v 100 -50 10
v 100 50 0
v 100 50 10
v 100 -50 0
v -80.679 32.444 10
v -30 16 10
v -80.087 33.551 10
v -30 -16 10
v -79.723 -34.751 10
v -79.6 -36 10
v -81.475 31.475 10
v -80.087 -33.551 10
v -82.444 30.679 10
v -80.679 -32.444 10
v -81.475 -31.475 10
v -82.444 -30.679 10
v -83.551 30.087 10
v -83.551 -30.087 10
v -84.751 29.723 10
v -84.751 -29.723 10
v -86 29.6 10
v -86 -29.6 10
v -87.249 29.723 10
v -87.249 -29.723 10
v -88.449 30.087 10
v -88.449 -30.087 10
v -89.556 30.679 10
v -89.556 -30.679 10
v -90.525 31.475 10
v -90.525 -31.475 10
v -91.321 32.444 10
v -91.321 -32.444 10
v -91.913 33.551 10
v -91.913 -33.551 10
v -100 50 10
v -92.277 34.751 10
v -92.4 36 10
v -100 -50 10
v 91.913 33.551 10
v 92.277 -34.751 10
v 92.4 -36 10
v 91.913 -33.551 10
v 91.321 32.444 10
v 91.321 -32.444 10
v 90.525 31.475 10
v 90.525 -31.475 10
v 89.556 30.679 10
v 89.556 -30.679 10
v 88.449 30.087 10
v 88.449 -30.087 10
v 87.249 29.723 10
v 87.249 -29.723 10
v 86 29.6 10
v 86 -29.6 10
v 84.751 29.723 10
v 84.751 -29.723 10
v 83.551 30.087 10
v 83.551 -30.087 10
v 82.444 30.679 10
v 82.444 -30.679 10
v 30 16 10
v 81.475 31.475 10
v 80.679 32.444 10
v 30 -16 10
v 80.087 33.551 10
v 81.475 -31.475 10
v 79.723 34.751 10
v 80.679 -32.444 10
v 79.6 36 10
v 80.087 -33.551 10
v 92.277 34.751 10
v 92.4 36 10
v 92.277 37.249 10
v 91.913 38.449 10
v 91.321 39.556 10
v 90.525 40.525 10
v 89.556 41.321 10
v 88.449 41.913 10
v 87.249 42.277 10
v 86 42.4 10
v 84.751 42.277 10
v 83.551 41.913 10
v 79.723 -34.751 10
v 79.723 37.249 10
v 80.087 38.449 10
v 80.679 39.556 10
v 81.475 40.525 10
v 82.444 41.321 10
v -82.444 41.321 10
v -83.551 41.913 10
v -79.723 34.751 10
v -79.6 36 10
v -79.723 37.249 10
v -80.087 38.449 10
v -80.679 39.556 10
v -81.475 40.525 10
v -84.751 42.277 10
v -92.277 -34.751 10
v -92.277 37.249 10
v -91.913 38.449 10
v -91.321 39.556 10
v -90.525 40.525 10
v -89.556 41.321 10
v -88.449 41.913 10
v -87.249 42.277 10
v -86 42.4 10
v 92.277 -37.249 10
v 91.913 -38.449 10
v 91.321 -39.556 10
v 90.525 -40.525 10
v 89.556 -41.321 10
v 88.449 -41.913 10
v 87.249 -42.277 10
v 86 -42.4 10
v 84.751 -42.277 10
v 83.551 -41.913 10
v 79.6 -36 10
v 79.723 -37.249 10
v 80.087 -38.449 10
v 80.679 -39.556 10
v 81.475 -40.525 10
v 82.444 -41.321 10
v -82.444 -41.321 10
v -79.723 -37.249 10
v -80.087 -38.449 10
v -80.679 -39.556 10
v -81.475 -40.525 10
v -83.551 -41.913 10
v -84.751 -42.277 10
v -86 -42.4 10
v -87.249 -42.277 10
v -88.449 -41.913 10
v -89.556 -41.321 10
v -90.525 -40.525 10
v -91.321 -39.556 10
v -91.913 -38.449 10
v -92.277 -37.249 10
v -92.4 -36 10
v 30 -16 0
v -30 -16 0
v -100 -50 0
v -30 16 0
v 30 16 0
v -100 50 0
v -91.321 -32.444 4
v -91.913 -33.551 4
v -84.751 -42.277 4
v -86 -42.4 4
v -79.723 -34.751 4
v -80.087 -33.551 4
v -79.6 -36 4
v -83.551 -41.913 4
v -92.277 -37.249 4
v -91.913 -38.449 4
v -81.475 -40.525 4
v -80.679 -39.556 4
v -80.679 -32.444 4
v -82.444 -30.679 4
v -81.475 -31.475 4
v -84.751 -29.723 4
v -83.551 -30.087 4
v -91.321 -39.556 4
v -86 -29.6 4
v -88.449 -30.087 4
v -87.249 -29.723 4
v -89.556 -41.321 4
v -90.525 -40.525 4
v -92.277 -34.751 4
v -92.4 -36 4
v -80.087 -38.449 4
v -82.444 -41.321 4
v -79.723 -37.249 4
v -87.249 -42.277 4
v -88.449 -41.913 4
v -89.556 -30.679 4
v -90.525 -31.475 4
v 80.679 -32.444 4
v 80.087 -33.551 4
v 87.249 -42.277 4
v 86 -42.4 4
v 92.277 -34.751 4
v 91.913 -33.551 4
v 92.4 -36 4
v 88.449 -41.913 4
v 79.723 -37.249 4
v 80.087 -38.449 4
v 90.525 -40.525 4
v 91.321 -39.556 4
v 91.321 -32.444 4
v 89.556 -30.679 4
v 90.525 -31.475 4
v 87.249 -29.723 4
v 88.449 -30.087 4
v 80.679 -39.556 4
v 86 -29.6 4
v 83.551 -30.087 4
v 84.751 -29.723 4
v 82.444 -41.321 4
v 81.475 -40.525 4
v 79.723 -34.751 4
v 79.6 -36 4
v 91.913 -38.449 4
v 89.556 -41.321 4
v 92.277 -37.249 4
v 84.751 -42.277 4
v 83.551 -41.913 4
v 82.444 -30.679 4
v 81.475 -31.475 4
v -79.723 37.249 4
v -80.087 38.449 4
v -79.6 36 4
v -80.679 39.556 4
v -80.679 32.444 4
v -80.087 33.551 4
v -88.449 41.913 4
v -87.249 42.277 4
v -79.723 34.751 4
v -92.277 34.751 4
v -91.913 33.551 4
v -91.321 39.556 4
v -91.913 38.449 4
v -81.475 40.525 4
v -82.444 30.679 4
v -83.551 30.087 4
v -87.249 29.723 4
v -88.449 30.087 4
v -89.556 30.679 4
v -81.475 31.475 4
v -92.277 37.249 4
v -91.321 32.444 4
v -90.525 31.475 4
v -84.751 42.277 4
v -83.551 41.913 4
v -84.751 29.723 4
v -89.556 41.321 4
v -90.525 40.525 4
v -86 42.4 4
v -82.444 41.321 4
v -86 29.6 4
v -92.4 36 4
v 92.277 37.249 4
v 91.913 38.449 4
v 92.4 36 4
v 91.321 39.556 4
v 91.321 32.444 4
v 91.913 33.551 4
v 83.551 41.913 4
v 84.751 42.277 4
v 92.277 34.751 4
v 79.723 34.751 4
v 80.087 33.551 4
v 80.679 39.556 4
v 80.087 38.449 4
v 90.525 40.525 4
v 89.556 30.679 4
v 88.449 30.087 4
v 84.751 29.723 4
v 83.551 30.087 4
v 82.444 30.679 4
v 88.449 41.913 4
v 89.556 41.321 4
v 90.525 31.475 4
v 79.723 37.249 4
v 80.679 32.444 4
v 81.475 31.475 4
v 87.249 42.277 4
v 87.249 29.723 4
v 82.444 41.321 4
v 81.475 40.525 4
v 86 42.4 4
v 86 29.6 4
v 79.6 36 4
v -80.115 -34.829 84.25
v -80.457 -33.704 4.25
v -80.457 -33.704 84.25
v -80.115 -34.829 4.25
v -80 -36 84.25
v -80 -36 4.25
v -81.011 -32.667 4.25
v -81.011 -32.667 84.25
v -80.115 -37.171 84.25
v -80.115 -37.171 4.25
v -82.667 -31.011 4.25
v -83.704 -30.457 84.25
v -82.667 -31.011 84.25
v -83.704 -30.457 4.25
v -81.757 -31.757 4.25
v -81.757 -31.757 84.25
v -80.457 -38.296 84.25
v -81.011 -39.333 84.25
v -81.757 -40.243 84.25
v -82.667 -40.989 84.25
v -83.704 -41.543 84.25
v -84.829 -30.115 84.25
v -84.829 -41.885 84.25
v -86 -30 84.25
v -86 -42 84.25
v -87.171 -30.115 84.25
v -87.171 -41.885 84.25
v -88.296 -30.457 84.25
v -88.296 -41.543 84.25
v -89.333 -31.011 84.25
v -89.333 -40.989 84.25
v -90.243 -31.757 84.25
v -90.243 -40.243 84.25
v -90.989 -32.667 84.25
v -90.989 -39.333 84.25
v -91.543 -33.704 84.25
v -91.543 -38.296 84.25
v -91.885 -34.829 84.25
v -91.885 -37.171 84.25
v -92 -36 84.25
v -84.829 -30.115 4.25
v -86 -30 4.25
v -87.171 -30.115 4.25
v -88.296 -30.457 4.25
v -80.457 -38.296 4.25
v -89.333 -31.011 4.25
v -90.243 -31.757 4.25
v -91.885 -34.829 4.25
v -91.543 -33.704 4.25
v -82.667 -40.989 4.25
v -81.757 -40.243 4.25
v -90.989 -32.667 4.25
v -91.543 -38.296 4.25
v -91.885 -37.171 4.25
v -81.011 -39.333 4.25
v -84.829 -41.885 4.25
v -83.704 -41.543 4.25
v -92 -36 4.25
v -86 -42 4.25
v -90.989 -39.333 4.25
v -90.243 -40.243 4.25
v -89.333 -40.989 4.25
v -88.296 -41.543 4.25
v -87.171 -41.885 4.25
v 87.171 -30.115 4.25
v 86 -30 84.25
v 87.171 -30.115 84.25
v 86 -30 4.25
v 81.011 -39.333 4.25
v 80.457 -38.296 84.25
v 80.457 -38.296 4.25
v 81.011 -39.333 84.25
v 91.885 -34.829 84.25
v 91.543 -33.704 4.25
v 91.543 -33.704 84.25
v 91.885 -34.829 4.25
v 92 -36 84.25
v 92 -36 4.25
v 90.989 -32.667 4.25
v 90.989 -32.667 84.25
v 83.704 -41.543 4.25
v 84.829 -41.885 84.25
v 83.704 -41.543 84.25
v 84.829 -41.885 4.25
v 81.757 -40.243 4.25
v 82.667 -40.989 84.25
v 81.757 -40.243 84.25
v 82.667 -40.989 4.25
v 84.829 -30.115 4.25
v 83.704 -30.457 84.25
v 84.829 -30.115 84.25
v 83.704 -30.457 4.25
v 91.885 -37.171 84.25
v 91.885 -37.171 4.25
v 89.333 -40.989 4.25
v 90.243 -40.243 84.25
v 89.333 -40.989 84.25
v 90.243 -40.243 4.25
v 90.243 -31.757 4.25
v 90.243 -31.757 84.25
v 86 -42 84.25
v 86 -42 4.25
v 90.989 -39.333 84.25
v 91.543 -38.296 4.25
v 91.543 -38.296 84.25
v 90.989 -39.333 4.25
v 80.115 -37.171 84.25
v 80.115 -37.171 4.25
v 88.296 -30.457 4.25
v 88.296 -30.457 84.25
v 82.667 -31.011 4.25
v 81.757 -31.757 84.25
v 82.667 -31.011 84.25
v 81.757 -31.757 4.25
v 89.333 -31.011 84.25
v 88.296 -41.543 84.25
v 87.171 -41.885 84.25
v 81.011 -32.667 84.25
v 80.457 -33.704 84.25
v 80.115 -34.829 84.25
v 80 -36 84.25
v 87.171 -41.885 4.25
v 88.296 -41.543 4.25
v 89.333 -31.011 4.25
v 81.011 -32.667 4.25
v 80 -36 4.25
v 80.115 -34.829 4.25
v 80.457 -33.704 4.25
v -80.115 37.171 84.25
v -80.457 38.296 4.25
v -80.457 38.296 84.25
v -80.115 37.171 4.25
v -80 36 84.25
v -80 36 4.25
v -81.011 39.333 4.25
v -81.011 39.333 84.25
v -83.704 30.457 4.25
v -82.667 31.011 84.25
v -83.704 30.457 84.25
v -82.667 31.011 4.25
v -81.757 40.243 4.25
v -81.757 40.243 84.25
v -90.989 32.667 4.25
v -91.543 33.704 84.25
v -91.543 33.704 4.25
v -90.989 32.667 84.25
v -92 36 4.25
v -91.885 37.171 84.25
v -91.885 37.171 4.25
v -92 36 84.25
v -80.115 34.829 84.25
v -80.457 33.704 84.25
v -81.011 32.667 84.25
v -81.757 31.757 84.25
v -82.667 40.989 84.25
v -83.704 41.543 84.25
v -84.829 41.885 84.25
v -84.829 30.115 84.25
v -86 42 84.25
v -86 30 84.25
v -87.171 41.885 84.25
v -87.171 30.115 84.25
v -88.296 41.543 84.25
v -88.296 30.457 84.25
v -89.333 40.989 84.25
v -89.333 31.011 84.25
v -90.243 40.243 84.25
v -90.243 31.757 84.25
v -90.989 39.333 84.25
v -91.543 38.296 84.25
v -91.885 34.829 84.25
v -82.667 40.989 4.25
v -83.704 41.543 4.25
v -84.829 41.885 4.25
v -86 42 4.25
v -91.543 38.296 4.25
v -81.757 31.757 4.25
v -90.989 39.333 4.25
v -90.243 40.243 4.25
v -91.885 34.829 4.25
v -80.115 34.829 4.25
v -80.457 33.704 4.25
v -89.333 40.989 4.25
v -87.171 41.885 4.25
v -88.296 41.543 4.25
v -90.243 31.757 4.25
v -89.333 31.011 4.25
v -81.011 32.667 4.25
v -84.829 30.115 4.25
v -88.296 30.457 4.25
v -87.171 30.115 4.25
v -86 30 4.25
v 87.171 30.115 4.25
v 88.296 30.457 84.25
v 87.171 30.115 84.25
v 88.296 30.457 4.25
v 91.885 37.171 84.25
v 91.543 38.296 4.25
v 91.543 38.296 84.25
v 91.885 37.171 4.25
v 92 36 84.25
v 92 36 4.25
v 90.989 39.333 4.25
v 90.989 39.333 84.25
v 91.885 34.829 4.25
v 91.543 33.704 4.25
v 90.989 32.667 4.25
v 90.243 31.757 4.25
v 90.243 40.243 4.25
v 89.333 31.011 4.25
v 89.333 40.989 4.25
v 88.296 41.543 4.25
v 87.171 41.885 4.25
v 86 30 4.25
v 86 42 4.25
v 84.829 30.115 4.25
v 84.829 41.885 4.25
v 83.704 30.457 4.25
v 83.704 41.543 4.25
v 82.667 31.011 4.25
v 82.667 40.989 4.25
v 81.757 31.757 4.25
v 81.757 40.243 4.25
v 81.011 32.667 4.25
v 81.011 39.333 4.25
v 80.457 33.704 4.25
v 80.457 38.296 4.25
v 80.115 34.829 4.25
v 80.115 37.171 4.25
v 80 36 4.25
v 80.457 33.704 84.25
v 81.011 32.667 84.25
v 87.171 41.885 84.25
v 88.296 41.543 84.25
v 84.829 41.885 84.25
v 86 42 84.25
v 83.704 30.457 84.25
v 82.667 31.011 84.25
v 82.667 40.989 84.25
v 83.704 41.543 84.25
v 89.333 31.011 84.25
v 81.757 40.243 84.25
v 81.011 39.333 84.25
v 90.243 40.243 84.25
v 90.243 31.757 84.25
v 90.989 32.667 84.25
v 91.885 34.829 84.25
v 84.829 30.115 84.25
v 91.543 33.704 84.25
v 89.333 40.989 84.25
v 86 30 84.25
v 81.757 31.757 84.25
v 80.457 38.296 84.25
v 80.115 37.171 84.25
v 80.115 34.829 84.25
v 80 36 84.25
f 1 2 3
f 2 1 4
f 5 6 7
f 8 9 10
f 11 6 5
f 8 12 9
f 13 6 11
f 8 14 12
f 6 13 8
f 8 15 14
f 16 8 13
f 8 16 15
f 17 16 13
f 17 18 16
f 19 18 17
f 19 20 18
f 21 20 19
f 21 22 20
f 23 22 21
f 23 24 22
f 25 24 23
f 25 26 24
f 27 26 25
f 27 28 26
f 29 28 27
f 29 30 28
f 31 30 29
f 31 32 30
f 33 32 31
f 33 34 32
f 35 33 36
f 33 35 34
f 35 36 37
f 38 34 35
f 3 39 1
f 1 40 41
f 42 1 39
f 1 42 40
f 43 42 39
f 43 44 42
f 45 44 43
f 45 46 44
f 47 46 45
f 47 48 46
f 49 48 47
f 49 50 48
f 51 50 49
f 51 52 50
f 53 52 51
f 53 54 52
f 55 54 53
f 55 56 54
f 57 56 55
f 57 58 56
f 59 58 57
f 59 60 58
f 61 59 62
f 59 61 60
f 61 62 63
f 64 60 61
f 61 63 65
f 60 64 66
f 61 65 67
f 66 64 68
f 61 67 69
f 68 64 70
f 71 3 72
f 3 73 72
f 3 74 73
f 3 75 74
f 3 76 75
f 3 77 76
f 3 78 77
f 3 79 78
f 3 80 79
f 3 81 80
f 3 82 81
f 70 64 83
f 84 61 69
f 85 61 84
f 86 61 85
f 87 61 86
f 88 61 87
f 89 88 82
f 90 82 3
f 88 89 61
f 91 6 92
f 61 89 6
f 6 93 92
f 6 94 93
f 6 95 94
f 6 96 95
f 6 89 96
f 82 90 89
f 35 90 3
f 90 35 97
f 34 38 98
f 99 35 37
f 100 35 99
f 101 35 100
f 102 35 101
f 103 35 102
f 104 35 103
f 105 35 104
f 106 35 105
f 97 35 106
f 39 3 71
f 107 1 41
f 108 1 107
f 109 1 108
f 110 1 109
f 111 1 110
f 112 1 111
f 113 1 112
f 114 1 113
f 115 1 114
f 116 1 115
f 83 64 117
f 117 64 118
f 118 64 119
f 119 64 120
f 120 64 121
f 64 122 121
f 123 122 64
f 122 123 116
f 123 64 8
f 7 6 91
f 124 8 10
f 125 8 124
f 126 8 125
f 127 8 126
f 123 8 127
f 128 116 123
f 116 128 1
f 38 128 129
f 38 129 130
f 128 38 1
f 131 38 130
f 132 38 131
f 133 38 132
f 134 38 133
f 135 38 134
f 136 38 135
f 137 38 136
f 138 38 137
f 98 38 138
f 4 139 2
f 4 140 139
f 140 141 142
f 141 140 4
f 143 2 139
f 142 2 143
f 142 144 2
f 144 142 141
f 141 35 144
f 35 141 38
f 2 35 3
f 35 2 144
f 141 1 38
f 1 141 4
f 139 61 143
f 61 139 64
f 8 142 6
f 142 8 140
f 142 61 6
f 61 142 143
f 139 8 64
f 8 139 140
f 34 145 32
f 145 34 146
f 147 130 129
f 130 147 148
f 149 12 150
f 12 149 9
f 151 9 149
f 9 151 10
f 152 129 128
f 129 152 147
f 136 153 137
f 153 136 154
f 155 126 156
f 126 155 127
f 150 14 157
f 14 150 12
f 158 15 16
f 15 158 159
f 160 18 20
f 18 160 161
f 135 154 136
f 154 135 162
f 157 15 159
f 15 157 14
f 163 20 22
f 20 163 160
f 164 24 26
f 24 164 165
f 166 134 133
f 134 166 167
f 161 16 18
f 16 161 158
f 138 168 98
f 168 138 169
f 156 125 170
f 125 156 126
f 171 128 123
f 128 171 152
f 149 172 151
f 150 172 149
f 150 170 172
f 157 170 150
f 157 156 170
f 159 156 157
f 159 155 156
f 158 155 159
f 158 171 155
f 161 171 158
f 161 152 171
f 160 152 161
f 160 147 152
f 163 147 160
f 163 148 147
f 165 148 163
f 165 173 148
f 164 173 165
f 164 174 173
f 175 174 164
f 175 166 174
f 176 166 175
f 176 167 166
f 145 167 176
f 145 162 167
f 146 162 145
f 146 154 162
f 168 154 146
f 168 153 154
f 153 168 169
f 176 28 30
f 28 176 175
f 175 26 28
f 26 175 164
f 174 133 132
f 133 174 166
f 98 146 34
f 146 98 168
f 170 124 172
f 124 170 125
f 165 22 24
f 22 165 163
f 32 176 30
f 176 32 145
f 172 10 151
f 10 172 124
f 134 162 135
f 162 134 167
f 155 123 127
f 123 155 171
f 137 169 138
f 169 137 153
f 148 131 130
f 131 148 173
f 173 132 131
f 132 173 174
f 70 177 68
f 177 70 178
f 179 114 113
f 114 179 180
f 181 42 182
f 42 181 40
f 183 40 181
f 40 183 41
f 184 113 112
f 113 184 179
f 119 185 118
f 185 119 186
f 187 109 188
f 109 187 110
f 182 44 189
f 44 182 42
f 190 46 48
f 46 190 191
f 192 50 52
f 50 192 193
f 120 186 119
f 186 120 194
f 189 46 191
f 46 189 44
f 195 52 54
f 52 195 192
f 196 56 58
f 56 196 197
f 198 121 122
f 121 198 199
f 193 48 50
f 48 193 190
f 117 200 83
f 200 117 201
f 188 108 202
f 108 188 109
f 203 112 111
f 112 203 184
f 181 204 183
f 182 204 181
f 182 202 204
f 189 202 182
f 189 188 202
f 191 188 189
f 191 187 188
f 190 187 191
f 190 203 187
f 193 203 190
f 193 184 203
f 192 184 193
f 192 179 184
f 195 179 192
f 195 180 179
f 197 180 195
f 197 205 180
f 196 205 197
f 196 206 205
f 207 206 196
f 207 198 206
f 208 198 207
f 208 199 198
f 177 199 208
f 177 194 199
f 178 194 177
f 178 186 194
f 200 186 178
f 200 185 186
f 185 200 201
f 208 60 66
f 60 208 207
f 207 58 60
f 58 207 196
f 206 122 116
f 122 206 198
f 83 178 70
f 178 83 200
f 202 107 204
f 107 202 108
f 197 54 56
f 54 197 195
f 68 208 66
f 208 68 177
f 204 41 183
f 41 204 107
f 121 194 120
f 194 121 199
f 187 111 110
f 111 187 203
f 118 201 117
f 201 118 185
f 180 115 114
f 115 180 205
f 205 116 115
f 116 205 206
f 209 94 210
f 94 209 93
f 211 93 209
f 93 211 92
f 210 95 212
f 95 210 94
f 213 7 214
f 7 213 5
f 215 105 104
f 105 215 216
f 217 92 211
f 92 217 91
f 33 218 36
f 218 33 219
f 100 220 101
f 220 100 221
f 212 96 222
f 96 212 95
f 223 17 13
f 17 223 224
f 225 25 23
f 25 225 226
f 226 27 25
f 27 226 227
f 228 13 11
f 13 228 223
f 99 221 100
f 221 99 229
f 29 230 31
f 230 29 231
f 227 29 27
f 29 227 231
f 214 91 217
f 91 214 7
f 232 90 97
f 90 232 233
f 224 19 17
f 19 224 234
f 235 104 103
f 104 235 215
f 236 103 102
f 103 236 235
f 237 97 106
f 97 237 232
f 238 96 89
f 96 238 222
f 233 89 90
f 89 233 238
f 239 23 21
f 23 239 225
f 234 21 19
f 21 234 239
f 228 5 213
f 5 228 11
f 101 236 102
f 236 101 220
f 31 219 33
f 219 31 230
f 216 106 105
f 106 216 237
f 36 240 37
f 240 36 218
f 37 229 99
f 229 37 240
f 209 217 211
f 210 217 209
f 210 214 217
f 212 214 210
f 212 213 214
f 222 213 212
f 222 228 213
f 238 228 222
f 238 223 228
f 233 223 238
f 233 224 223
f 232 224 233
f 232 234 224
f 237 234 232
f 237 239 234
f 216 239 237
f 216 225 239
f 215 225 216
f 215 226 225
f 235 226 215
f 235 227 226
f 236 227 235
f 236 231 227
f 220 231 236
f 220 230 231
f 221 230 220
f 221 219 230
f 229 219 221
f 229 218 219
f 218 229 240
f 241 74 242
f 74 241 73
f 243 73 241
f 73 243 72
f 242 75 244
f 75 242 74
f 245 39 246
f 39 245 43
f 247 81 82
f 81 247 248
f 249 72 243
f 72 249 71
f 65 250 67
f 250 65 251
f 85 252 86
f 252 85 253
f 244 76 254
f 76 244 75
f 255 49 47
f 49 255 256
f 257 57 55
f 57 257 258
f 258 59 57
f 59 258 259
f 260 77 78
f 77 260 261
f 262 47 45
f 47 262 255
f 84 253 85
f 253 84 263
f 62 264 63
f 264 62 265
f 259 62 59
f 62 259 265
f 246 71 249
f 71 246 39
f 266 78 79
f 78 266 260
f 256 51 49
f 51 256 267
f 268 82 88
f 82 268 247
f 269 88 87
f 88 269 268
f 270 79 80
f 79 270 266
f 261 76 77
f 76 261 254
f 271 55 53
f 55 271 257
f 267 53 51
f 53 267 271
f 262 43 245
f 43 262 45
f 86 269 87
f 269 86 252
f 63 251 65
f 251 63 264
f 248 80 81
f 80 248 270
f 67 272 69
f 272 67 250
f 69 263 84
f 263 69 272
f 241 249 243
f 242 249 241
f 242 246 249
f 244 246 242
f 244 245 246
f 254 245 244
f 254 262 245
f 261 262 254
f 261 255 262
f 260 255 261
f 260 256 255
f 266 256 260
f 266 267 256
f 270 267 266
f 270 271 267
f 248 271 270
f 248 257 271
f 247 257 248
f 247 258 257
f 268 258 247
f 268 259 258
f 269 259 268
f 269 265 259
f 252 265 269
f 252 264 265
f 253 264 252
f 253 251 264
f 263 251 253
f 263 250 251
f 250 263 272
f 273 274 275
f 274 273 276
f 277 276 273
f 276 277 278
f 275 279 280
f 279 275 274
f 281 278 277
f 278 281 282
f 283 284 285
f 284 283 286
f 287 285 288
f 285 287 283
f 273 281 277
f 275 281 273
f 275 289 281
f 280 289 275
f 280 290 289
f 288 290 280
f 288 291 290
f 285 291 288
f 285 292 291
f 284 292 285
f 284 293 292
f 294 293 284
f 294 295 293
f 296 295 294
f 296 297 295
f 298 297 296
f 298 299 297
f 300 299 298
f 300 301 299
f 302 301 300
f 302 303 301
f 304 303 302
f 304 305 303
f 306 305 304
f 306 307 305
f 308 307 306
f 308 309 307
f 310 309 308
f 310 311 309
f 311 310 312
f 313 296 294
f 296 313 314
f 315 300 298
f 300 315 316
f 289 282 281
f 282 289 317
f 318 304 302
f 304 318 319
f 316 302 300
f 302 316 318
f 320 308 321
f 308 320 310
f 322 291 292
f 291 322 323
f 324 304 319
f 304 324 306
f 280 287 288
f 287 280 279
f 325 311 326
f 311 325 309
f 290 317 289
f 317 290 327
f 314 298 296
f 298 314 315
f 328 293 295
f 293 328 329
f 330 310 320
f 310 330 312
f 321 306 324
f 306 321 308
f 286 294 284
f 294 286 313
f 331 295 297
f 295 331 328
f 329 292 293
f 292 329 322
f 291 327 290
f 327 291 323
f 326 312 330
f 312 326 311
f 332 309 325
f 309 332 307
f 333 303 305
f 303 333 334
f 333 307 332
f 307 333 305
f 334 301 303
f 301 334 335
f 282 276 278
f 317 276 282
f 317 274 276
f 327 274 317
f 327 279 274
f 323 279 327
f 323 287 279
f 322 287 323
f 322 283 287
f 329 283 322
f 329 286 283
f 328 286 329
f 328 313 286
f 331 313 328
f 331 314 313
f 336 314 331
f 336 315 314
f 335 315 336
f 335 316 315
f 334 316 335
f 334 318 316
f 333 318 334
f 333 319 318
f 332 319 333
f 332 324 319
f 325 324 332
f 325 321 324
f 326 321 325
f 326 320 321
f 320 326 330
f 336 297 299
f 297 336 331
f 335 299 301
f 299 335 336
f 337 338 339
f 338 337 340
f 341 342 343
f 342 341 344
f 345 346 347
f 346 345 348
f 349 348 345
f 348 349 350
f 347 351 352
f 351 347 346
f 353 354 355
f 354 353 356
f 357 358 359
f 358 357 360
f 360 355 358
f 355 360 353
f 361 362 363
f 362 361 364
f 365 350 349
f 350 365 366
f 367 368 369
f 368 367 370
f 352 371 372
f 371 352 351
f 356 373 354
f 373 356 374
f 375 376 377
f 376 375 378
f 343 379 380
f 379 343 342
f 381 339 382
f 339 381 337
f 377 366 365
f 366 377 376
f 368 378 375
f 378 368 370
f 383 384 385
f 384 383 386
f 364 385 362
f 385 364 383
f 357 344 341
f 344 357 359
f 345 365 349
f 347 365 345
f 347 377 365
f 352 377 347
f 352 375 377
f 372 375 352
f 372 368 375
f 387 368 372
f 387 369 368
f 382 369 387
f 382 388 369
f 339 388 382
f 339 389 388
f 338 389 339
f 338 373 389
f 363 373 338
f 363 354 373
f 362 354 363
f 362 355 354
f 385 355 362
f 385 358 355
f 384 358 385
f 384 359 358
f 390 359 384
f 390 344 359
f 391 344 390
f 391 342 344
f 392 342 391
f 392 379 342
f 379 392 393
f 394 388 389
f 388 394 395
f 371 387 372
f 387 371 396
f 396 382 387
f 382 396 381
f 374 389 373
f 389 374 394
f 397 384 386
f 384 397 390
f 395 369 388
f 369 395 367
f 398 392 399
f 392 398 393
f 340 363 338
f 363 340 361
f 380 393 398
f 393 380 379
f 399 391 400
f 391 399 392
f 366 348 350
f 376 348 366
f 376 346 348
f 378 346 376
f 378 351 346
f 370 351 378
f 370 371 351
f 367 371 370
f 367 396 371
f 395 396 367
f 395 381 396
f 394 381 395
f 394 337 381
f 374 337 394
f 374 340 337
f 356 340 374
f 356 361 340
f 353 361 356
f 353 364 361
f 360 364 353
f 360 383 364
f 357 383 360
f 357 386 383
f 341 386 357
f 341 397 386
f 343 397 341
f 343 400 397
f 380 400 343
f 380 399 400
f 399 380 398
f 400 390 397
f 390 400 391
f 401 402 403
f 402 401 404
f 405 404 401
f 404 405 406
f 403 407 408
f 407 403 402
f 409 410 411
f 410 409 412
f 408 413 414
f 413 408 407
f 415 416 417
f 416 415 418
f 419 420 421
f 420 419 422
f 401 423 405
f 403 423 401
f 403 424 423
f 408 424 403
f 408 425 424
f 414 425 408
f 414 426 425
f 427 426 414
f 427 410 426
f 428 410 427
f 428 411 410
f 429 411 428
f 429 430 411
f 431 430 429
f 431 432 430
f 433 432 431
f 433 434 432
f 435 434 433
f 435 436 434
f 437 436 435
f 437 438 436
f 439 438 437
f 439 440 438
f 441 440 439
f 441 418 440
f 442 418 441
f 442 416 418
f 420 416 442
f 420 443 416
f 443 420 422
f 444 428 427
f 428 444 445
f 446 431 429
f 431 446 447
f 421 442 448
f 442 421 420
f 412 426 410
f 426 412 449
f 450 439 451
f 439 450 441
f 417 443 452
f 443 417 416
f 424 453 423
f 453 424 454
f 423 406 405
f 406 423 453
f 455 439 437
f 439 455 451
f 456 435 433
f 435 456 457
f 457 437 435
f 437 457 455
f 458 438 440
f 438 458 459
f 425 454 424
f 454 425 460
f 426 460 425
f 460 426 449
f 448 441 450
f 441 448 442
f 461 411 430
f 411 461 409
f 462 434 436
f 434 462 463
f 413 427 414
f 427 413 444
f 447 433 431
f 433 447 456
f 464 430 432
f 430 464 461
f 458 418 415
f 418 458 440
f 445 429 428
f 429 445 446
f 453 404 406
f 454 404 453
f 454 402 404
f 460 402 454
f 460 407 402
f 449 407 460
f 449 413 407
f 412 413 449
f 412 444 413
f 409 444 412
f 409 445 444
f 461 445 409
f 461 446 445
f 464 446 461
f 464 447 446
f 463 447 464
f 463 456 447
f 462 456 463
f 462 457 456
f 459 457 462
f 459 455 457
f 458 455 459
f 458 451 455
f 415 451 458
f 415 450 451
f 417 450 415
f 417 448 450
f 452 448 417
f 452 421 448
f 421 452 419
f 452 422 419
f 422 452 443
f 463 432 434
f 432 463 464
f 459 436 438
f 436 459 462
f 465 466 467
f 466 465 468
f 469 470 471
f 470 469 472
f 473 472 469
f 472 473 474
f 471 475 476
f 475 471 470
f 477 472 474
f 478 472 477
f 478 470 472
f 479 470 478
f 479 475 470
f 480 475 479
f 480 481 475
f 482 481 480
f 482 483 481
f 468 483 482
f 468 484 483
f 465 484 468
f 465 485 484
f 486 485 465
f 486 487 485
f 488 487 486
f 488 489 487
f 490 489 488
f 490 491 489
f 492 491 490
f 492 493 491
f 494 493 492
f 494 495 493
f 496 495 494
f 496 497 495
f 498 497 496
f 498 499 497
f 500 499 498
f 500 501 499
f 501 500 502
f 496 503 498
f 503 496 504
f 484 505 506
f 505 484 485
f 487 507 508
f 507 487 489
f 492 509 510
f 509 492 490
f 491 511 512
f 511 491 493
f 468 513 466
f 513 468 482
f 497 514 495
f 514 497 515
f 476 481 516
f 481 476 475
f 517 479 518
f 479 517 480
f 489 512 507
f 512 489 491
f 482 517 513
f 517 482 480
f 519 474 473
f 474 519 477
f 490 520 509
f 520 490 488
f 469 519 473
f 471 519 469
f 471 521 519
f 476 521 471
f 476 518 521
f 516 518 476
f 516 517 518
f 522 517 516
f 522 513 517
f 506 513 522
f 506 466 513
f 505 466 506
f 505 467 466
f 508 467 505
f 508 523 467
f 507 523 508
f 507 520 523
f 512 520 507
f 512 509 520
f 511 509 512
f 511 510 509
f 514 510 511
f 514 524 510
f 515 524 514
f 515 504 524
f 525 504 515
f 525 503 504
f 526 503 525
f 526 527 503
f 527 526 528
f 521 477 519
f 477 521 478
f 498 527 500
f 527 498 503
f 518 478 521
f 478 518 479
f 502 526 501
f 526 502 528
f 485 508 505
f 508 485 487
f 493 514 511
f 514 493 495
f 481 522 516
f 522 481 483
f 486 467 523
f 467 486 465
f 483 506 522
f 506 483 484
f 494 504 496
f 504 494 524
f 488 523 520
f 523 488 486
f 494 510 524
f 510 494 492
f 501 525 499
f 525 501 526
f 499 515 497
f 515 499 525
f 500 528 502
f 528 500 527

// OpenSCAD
$fn = 32;

// ------------------------------------------------------------------------
// Frame with four posts: 200 x 100 mm frame, four d12 posts
// Every part is its own module, assembly() places them once.
// ------------------------------------------------------------------------

// --- part 1 ---
module base_frame() {
  difference() {
    translate([-100, -50, 0]) cube([200, 100, 10]);
    translate([-30, -16, -1]) cube([60, 32, 12]);
    translate([-86, -36, 4]) cylinder(h = 7, d = 12.8);
    translate([86, -36, 4]) cylinder(h = 7, d = 12.8);
    translate([-86, 36, 4]) cylinder(h = 7, d = 12.8);
    translate([86, 36, 4]) cylinder(h = 7, d = 12.8);
  }
}

// --- part 2 ---
module post1() {
  cylinder(h = 80, d = 12);
}

// --- part 3 ---
module post2() {
  cylinder(h = 80, d = 12);
}

// --- part 4 ---
module post3() {
  cylinder(h = 80, d = 12);
}

// --- part 5 ---
module post4() {
  cylinder(h = 80, d = 12);
}

// --- assembly ---
module assembly() {
  translate([0, 0, 0]) rotate([0, 0, 0]) base_frame();
  translate([-86, -36, 4.25]) rotate([0, 0, 0]) post1();
  translate([86, -36, 4.25]) rotate([0, 0, 0]) post2();
  translate([-86, 36, 4.25]) rotate([0, 0, 0]) post3();
  translate([86, 36, 4.25]) rotate([0, 0, 0]) post4();
}

assembly();
